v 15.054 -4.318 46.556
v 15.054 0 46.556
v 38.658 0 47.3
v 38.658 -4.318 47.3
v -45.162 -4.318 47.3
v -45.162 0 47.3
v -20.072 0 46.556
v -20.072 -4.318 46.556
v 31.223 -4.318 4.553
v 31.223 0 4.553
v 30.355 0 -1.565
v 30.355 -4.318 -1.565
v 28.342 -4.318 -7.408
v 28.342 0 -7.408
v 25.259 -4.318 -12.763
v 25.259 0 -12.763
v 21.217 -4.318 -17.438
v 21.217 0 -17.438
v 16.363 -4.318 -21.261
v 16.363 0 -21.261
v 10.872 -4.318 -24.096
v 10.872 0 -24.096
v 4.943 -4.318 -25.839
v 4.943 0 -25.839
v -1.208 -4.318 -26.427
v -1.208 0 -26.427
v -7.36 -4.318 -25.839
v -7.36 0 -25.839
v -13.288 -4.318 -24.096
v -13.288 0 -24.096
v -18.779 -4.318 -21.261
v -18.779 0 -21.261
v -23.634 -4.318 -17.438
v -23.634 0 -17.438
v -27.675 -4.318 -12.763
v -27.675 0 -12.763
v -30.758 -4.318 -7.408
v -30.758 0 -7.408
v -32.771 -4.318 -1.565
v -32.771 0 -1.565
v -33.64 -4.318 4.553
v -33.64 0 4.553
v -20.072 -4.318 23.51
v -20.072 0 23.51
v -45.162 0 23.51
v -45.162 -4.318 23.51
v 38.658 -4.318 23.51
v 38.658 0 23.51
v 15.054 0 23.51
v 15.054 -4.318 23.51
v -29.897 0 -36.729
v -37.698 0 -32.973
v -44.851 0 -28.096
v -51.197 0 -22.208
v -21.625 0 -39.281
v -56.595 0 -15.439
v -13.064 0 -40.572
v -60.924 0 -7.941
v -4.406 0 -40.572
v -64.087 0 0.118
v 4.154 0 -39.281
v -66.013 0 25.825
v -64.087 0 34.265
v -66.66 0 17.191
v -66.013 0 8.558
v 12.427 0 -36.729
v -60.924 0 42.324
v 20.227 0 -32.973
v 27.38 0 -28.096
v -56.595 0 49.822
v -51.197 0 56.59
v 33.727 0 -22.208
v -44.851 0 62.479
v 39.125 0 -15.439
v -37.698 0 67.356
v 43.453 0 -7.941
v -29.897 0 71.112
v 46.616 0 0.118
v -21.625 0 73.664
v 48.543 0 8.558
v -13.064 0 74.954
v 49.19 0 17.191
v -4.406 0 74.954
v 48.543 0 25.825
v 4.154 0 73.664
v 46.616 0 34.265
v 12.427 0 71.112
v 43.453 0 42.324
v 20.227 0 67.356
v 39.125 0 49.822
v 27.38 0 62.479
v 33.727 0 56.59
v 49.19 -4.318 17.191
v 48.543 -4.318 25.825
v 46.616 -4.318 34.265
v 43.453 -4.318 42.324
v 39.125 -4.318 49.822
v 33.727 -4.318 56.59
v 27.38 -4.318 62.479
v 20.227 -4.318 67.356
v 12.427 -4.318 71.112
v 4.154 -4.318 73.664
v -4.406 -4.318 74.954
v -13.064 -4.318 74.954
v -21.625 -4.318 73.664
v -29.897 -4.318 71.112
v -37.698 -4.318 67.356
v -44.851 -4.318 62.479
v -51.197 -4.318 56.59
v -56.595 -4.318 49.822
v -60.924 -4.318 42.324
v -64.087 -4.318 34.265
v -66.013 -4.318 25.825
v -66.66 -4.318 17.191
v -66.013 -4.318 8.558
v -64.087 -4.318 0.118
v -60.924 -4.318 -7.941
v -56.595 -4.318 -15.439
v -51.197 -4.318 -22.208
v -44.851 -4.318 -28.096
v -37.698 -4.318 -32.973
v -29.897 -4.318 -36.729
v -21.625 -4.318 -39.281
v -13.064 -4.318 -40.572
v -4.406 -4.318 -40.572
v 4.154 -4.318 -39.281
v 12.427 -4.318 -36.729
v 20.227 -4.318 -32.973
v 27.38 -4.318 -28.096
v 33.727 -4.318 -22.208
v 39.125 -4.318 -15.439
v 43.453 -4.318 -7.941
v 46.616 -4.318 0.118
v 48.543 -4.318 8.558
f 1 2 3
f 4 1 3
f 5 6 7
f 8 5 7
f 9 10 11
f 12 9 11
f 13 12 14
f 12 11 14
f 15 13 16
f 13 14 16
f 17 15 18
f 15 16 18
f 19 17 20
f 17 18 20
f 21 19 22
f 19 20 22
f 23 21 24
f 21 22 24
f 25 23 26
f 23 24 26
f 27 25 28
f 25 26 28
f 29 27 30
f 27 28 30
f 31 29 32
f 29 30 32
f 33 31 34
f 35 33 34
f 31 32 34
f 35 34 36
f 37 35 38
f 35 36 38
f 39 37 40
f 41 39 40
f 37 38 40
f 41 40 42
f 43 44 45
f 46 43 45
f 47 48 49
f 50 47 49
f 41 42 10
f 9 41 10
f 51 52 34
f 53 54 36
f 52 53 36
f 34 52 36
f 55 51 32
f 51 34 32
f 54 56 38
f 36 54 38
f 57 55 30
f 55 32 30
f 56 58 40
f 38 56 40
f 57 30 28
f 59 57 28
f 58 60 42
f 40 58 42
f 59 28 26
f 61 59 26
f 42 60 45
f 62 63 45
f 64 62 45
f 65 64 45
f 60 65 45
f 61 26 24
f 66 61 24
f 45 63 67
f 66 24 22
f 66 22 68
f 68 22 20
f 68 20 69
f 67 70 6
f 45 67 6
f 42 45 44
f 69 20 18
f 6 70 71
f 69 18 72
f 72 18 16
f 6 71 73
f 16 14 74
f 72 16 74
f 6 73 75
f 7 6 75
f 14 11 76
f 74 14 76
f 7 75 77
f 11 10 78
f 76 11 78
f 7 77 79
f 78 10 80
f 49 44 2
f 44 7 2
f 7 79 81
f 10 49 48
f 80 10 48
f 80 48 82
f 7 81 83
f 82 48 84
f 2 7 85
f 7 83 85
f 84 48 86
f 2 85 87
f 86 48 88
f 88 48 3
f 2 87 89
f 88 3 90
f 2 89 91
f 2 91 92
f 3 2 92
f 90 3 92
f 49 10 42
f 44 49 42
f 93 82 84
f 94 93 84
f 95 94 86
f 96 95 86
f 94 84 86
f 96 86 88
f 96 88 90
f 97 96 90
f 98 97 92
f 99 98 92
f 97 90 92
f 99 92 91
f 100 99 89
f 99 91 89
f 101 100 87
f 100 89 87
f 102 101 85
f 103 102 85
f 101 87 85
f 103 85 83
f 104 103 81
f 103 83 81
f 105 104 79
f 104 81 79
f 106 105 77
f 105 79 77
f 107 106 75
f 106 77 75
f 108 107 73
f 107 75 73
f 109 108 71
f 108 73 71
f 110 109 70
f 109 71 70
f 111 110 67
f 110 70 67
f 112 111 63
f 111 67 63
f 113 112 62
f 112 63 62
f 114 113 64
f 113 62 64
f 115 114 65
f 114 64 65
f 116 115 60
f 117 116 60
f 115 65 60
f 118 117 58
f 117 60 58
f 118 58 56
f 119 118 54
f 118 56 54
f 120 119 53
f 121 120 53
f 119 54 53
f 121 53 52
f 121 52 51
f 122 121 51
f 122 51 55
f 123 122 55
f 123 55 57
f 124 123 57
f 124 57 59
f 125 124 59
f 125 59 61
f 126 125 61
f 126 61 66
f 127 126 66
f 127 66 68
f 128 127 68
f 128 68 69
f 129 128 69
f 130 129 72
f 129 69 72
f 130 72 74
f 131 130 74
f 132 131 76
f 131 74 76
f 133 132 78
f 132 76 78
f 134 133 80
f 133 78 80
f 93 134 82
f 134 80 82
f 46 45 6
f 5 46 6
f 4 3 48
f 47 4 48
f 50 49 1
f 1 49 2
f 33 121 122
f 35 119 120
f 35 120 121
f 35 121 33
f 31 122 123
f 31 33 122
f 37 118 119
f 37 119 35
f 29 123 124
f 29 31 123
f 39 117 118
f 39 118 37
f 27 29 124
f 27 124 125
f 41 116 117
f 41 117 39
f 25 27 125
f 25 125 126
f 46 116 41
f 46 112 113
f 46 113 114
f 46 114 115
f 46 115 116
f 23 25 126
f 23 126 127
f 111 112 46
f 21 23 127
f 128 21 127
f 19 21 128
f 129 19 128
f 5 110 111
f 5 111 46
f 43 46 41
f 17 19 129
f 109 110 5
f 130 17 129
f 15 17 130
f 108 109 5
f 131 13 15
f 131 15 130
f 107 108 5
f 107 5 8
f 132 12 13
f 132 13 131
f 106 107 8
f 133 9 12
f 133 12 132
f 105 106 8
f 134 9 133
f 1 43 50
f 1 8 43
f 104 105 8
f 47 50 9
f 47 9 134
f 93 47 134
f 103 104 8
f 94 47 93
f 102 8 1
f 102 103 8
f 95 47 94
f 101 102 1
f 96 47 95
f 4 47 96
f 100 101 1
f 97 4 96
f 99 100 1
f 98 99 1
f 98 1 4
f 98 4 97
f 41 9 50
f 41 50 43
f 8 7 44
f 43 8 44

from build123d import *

# Parameters (mm, degrees)
F0_R     = 57.924957
F1_DEPTH = 4.318


with BuildPart() as f1:
    # F0 (on Front) → F1 (new body)
    with BuildSketch(Plane.XZ):
        with Locations((-8.735122, 17.191464)):
            Circle(F0_R)
        with BuildLine():
            ThreePointArc((31.223414, 4.553415), (-1.208049, -26.427396), (-33.639513, 4.553415))
            Line((-33.639513, 4.553415), (31.223414, 4.553415))
        make_face(mode=Mode.SUBTRACT)
        Polygon((-45.162439, 23.510488), (-45.162439, 47.299758), (-20.072196, 46.556342), (-20.072196, 23.510488), align=None, mode=Mode.SUBTRACT)
        Polygon((15.054147, 23.510488), (15.054147, 46.556342), (38.657561, 47.299758), (38.657561, 23.510488), align=None, mode=Mode.SUBTRACT)
    extrude(amount=F1_DEPTH)


solid = f1.part
